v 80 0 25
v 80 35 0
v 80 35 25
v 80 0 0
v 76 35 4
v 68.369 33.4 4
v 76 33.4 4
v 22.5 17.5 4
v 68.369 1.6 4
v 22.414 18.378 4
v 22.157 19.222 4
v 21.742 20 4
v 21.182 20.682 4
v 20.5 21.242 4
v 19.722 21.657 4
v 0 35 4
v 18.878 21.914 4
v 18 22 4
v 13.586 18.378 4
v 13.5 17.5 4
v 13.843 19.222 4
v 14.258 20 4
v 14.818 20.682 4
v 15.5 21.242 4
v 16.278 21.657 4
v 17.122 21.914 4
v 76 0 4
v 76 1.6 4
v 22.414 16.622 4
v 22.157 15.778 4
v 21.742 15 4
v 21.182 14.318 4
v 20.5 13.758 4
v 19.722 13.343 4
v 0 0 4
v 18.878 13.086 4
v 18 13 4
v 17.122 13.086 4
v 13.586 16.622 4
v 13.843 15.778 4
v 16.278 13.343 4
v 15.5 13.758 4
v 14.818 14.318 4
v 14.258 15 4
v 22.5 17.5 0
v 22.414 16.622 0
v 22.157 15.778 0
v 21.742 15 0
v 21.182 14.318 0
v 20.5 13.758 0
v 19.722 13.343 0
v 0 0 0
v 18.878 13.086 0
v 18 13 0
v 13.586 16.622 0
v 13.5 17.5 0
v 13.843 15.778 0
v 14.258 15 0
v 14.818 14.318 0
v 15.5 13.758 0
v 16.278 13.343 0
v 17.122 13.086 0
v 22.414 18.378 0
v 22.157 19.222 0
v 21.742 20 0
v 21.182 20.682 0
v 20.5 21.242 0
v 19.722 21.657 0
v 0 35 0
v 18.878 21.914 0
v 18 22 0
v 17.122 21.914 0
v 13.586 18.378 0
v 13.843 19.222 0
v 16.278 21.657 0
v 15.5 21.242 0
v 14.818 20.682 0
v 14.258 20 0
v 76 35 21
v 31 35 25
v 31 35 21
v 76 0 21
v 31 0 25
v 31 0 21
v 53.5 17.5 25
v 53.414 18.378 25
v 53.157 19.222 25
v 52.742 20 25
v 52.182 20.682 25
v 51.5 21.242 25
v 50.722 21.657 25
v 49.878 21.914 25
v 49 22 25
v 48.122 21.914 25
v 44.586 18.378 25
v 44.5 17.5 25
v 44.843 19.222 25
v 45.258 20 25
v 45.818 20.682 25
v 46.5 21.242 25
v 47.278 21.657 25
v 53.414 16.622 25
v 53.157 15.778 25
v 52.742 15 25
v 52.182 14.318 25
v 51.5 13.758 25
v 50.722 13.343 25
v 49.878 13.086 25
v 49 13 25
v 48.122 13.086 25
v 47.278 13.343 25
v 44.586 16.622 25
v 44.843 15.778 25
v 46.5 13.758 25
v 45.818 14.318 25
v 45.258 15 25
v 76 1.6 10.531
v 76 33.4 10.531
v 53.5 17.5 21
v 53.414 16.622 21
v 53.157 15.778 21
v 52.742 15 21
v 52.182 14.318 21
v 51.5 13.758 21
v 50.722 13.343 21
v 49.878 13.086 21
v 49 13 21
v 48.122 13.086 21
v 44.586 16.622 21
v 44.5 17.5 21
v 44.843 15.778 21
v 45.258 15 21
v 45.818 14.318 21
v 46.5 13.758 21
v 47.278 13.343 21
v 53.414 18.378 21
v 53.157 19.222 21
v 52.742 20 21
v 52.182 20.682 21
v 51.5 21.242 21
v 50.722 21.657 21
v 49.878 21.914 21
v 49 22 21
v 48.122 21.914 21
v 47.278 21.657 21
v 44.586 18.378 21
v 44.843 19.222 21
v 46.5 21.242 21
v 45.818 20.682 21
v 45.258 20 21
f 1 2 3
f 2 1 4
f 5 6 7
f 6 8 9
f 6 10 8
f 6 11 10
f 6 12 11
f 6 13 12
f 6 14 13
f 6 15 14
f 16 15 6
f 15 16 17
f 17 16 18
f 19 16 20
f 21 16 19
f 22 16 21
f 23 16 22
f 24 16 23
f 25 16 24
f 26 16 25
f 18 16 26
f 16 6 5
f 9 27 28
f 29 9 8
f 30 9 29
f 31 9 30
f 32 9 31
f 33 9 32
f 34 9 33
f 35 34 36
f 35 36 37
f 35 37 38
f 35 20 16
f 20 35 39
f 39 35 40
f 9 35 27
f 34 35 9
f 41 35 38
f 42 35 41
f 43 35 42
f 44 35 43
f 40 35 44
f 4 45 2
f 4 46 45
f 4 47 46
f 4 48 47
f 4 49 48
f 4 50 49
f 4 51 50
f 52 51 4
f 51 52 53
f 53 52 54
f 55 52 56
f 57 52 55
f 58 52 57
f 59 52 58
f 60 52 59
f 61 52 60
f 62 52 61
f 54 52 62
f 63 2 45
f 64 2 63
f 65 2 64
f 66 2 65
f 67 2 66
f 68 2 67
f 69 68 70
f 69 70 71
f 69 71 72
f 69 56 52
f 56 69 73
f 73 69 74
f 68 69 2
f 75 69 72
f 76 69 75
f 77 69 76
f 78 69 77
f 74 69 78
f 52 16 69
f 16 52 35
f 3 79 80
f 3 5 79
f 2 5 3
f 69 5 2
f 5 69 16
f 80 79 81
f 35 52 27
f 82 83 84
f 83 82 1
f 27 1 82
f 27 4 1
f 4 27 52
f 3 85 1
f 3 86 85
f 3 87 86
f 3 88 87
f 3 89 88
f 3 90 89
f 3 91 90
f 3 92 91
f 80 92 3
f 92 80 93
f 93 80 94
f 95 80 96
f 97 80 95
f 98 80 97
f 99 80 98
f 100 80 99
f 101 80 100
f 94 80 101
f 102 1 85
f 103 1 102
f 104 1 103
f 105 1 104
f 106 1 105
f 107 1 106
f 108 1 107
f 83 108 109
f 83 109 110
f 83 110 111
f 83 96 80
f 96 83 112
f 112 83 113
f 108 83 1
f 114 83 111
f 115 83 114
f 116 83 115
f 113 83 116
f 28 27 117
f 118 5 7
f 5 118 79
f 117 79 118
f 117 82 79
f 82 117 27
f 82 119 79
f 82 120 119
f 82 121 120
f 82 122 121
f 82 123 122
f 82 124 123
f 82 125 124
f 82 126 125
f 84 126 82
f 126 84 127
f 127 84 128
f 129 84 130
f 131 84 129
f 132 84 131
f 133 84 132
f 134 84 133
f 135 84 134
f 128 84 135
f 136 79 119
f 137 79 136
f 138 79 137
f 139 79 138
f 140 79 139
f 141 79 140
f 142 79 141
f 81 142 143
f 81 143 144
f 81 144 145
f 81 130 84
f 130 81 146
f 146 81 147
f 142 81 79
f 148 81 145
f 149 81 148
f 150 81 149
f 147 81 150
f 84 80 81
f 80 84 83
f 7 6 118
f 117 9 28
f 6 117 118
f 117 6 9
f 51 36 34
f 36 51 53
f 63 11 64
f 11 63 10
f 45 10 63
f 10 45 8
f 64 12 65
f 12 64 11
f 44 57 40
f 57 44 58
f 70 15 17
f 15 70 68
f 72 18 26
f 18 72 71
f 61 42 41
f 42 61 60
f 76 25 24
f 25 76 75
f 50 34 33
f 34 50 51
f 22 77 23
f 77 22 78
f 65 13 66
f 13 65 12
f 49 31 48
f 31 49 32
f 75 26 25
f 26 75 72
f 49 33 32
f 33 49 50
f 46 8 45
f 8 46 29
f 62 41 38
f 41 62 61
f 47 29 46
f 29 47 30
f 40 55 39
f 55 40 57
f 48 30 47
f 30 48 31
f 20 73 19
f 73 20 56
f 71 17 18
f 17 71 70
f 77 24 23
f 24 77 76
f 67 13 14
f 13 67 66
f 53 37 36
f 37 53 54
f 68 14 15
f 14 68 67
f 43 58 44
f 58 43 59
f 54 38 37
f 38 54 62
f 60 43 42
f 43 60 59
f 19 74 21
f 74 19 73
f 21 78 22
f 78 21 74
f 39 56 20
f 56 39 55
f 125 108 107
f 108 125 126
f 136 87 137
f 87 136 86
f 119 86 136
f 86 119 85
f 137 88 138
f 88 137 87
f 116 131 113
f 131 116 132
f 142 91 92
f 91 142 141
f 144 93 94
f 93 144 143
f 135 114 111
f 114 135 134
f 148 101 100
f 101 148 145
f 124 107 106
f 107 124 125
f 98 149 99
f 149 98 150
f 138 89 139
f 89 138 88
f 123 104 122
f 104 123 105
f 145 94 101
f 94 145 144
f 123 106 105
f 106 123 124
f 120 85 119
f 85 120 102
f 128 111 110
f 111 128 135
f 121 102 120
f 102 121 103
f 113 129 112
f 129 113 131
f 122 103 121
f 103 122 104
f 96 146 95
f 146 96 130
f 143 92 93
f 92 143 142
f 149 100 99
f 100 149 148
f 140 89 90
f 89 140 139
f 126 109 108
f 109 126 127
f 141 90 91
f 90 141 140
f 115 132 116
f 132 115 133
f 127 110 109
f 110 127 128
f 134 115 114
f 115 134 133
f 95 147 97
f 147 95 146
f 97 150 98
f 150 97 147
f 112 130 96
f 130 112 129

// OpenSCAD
$fn = 32;

// ----------------------------------------------------------------------
// Z-bracket: 80 x 35 x 25 mm
// ----------------------------------------------------------------------

// --- parameters (mm) ---
bottom_run = 80;          // lower foot length, X
top_run = 45;             // upper foot length, X
profile_w = 35;           // bracket width, Y
height = 25;              // overall rise, Z
mat_t = 4;                // plate thickness
hole_d = 9;               // clearance for M8
rib_len = 9.5;            // gusset leg
rib_sink = 1.6;           // gusset overlap into the plates

module hole_z(px, py, z0) {
  translate([px, py, z0 - 2.5]) cylinder(h = mat_t + 5, d = hole_d);
}
module hole_x(py, pz) {
  translate([-2.5, py, pz]) rotate([0, 90, 0]) cylinder(h = mat_t + 5, d = hole_d);
}
module gusset(x0) {
  translate([x0, profile_w - rib_sink, 0])
    rotate([90, 0, 0])
      linear_extrude(height = profile_w - 2 * rib_sink)
        polygon(points = [[rib_sink, mat_t - rib_sink],
                          [rib_sink, mat_t - rib_sink + rib_len],
                          [-rib_len, mat_t - rib_sink]]);
}

difference() {
  union() {
    cube([bottom_run, profile_w, mat_t]);
    /* web, overlapping the lower foot */
    translate([bottom_run - mat_t, 0, 0]) cube([mat_t, profile_w, height]);
    /* upper foot, sunk into the web */
    translate([bottom_run - mat_t - top_run, 0, height - mat_t]) cube([top_run + mat_t, profile_w, mat_t]);
    gusset(bottom_run - mat_t);
  }
  hole_z(18, 17.5, 0);
  translate([bottom_run - mat_t - 27, 0, 0]) hole_z(0, 17.5, height - mat_t);
}
